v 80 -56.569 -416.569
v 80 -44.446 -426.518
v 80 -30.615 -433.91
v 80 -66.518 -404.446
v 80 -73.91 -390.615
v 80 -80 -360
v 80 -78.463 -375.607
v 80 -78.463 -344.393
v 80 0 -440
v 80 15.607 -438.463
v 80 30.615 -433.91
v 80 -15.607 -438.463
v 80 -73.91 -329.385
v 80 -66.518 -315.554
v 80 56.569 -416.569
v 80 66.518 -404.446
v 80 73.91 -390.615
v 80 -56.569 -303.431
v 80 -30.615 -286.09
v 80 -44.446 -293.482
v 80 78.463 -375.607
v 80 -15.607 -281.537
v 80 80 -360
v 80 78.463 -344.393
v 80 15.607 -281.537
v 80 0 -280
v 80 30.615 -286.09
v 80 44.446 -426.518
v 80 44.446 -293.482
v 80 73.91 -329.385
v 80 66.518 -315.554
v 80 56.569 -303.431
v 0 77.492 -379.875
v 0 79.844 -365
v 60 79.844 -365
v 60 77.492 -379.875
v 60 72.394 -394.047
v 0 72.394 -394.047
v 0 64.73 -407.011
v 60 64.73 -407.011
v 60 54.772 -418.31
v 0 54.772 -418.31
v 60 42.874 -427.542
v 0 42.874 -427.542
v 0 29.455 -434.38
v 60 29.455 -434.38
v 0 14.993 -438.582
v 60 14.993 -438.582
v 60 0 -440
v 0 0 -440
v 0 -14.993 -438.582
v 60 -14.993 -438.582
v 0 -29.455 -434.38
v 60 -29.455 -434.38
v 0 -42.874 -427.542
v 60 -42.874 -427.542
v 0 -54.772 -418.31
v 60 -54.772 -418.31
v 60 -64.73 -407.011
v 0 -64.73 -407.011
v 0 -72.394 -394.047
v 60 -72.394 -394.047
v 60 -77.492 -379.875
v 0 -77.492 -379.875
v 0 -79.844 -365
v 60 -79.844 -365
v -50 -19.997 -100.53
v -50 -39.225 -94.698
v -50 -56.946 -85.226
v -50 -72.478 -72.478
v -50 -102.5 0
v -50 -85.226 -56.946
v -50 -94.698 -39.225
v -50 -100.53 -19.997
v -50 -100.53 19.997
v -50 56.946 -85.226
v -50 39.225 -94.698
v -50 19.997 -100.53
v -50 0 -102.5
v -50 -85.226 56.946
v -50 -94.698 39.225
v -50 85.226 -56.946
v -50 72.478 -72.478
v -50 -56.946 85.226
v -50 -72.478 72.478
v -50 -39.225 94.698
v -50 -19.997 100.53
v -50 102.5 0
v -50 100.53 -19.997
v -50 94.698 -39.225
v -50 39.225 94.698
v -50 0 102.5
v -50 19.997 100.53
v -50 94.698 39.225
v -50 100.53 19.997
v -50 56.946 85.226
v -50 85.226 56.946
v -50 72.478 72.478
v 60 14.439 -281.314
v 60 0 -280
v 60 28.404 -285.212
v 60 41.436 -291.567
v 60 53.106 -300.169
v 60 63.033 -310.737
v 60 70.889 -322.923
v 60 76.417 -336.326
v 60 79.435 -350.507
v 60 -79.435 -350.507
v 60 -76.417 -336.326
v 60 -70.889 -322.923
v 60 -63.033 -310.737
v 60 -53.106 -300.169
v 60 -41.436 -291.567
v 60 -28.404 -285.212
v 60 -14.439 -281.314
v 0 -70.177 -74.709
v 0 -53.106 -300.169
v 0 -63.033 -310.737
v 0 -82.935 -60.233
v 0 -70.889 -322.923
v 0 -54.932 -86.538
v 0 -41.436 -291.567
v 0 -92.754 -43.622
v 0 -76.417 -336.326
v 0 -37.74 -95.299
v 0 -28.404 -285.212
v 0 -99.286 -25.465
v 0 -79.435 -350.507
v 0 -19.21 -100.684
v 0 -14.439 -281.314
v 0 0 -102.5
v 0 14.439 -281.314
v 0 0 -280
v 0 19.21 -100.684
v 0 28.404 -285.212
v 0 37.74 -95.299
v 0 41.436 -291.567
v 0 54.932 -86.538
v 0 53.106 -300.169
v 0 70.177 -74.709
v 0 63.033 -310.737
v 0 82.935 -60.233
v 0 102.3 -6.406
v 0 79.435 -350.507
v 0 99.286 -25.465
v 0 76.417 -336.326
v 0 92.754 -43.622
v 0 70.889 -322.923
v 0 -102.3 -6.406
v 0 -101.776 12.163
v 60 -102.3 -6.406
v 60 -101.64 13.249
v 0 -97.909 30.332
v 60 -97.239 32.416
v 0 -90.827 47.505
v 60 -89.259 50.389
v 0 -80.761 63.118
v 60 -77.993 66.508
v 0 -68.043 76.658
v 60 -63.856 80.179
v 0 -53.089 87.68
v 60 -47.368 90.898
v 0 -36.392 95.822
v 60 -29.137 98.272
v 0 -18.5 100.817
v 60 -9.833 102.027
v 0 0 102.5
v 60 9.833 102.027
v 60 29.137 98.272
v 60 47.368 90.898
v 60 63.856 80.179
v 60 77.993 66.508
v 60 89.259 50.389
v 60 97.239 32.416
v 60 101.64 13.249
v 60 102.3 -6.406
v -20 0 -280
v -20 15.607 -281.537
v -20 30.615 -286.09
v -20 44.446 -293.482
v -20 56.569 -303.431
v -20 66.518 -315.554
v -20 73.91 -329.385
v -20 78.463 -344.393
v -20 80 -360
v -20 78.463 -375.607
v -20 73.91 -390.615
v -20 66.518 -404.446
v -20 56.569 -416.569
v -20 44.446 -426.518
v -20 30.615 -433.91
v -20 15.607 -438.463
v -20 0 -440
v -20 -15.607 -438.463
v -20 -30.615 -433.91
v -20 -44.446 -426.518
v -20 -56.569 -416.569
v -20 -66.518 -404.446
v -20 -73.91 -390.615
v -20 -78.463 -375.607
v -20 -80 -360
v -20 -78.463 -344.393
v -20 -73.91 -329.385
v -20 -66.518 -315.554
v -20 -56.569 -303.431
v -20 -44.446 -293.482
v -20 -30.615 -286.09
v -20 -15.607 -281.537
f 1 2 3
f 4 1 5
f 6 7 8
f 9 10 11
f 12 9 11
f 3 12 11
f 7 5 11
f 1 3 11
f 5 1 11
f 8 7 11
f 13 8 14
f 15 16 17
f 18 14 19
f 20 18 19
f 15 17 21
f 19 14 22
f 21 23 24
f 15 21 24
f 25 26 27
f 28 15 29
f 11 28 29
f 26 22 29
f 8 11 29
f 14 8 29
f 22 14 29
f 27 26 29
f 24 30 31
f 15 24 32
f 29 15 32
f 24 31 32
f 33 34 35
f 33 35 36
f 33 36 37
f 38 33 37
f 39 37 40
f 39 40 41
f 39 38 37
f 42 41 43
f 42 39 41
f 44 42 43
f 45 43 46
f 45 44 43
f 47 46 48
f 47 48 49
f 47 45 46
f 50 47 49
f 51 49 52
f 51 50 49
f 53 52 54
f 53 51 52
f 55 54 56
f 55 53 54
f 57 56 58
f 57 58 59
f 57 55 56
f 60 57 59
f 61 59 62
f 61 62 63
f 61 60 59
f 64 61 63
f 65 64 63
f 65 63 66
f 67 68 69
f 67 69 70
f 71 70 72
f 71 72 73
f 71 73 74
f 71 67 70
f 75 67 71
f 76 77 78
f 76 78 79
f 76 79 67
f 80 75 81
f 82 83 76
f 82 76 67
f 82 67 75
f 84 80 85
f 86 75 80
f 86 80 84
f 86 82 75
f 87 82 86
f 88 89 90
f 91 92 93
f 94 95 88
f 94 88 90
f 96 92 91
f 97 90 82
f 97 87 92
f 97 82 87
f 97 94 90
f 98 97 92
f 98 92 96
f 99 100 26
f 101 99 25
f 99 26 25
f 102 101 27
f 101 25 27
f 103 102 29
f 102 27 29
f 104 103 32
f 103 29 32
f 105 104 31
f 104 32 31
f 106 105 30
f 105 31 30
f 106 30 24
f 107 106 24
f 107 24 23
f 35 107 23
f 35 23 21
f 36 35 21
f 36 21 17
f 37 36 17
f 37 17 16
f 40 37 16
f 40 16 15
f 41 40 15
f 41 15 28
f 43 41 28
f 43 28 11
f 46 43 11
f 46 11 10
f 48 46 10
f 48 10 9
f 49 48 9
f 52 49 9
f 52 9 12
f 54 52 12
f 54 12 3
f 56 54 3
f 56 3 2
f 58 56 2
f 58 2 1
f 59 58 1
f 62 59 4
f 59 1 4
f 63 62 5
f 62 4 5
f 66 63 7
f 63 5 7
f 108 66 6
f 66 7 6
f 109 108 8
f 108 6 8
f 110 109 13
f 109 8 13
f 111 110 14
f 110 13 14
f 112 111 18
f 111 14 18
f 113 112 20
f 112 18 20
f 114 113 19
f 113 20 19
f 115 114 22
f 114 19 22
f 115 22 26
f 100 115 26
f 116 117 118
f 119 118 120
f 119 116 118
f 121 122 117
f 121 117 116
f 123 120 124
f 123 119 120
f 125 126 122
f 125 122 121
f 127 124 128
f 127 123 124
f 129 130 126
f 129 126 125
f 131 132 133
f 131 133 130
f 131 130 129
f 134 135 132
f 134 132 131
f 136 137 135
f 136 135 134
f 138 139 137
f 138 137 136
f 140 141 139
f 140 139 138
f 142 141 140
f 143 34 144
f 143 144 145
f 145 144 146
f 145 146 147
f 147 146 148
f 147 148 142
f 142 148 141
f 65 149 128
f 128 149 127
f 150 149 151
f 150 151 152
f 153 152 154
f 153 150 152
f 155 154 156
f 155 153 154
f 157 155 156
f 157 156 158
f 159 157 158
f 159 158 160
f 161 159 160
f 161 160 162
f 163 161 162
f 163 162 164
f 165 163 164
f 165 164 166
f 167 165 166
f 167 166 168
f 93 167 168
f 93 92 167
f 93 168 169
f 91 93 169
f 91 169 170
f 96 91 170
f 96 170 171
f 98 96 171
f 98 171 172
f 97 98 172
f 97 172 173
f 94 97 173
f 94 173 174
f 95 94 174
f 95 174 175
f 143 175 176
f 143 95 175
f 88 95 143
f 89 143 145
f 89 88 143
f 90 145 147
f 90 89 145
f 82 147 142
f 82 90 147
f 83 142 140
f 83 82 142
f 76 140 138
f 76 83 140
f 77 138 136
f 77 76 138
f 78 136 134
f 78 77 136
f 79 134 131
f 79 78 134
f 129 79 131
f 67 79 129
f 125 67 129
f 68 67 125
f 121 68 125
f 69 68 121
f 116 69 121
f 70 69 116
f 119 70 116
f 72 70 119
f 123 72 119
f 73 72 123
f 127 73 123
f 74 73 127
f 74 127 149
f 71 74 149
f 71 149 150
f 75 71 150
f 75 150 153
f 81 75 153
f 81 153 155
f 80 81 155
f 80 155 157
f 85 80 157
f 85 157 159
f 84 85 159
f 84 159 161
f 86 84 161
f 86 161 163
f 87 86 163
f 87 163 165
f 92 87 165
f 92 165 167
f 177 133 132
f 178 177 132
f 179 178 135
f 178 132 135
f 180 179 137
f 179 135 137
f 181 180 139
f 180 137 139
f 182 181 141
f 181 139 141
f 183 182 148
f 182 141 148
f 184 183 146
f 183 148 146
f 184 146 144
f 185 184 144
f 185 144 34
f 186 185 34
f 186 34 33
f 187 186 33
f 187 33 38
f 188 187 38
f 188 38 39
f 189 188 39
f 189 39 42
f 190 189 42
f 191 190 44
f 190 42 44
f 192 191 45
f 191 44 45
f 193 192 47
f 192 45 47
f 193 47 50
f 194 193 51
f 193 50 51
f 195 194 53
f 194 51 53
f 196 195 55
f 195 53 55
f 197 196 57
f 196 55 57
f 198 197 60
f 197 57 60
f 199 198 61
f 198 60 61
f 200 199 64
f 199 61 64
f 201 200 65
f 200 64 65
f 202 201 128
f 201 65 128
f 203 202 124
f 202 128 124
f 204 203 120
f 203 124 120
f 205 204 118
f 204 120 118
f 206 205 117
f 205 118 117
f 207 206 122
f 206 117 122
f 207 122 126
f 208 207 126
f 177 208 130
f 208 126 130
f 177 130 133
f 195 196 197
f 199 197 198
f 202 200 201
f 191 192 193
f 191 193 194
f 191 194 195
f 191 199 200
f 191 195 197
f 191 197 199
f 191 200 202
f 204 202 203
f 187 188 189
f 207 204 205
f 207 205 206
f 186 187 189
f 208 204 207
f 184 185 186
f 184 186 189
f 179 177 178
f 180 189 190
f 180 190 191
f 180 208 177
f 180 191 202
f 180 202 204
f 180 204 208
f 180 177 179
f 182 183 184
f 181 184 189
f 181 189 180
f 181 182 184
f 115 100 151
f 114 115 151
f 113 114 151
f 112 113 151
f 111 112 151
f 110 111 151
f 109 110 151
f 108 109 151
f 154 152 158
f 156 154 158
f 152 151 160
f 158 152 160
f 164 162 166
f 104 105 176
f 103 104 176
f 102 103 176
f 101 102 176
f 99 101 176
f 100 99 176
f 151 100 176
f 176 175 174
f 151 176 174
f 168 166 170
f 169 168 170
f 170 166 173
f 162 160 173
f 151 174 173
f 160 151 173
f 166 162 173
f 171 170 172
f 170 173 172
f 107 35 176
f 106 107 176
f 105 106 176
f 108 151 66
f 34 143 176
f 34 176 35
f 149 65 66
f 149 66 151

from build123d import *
from build123d.topology import SkipClean

# Parameters (mm, degrees)
BOSS_EXTRUDE2_DEPTH      = 60
BOSS_EXTRUDE4_START      = 50
SKETCH5_R                = 102.5
BOSS_EXTRUDE4_DEPTH      = 50
BOSS_EXTRUDE7_DEPTH      = 20
BOSS_EXTRUDE7_DEPTH_BACK = 80
SKETCH6_R                = 80


with BuildPart() as part:
    # Sketch2 → Boss-Extrude2 (new body)
    with BuildSketch(Plane(origin=(0, 0, 0), x_dir=(0, 0, -1), z_dir=(1, 0, 0))):
        with BuildLine():
            Line((6.40625, 102.299608801), (365, 79.843597113))
            ThreePointArc((365, 79.843597113), (440, 0), (365, -79.843597113))
            Line((365, -79.843597113), (6.40625, -102.299608801))
            ThreePointArc((6.40625, -102.299608801), (-102.5, 0), (6.40625, 102.299608801))
        make_face()
    extrude(amount=BOSS_EXTRUDE2_DEPTH)

    # Sketch5 → Boss-Extrude4 (add)
    with BuildSketch(Plane.ZY.offset(BOSS_EXTRUDE4_START)):
        Circle(SKETCH5_R)
    extrude(amount=-BOSS_EXTRUDE4_DEPTH)

    # Sketch6 → Boss-Extrude7 (add, two sides: drawn at the far end of the back side and taken through both)
    with SkipClean():  # the faces are left unmerged after this step: merging them gives an invalid solid
        with BuildSketch(Plane.ZY.offset(-BOSS_EXTRUDE7_DEPTH_BACK)):
            with Locations((-360, 0)):
                Circle(SKETCH6_R)
        extrude(amount=BOSS_EXTRUDE7_DEPTH + BOSS_EXTRUDE7_DEPTH_BACK)


solid = part.part
